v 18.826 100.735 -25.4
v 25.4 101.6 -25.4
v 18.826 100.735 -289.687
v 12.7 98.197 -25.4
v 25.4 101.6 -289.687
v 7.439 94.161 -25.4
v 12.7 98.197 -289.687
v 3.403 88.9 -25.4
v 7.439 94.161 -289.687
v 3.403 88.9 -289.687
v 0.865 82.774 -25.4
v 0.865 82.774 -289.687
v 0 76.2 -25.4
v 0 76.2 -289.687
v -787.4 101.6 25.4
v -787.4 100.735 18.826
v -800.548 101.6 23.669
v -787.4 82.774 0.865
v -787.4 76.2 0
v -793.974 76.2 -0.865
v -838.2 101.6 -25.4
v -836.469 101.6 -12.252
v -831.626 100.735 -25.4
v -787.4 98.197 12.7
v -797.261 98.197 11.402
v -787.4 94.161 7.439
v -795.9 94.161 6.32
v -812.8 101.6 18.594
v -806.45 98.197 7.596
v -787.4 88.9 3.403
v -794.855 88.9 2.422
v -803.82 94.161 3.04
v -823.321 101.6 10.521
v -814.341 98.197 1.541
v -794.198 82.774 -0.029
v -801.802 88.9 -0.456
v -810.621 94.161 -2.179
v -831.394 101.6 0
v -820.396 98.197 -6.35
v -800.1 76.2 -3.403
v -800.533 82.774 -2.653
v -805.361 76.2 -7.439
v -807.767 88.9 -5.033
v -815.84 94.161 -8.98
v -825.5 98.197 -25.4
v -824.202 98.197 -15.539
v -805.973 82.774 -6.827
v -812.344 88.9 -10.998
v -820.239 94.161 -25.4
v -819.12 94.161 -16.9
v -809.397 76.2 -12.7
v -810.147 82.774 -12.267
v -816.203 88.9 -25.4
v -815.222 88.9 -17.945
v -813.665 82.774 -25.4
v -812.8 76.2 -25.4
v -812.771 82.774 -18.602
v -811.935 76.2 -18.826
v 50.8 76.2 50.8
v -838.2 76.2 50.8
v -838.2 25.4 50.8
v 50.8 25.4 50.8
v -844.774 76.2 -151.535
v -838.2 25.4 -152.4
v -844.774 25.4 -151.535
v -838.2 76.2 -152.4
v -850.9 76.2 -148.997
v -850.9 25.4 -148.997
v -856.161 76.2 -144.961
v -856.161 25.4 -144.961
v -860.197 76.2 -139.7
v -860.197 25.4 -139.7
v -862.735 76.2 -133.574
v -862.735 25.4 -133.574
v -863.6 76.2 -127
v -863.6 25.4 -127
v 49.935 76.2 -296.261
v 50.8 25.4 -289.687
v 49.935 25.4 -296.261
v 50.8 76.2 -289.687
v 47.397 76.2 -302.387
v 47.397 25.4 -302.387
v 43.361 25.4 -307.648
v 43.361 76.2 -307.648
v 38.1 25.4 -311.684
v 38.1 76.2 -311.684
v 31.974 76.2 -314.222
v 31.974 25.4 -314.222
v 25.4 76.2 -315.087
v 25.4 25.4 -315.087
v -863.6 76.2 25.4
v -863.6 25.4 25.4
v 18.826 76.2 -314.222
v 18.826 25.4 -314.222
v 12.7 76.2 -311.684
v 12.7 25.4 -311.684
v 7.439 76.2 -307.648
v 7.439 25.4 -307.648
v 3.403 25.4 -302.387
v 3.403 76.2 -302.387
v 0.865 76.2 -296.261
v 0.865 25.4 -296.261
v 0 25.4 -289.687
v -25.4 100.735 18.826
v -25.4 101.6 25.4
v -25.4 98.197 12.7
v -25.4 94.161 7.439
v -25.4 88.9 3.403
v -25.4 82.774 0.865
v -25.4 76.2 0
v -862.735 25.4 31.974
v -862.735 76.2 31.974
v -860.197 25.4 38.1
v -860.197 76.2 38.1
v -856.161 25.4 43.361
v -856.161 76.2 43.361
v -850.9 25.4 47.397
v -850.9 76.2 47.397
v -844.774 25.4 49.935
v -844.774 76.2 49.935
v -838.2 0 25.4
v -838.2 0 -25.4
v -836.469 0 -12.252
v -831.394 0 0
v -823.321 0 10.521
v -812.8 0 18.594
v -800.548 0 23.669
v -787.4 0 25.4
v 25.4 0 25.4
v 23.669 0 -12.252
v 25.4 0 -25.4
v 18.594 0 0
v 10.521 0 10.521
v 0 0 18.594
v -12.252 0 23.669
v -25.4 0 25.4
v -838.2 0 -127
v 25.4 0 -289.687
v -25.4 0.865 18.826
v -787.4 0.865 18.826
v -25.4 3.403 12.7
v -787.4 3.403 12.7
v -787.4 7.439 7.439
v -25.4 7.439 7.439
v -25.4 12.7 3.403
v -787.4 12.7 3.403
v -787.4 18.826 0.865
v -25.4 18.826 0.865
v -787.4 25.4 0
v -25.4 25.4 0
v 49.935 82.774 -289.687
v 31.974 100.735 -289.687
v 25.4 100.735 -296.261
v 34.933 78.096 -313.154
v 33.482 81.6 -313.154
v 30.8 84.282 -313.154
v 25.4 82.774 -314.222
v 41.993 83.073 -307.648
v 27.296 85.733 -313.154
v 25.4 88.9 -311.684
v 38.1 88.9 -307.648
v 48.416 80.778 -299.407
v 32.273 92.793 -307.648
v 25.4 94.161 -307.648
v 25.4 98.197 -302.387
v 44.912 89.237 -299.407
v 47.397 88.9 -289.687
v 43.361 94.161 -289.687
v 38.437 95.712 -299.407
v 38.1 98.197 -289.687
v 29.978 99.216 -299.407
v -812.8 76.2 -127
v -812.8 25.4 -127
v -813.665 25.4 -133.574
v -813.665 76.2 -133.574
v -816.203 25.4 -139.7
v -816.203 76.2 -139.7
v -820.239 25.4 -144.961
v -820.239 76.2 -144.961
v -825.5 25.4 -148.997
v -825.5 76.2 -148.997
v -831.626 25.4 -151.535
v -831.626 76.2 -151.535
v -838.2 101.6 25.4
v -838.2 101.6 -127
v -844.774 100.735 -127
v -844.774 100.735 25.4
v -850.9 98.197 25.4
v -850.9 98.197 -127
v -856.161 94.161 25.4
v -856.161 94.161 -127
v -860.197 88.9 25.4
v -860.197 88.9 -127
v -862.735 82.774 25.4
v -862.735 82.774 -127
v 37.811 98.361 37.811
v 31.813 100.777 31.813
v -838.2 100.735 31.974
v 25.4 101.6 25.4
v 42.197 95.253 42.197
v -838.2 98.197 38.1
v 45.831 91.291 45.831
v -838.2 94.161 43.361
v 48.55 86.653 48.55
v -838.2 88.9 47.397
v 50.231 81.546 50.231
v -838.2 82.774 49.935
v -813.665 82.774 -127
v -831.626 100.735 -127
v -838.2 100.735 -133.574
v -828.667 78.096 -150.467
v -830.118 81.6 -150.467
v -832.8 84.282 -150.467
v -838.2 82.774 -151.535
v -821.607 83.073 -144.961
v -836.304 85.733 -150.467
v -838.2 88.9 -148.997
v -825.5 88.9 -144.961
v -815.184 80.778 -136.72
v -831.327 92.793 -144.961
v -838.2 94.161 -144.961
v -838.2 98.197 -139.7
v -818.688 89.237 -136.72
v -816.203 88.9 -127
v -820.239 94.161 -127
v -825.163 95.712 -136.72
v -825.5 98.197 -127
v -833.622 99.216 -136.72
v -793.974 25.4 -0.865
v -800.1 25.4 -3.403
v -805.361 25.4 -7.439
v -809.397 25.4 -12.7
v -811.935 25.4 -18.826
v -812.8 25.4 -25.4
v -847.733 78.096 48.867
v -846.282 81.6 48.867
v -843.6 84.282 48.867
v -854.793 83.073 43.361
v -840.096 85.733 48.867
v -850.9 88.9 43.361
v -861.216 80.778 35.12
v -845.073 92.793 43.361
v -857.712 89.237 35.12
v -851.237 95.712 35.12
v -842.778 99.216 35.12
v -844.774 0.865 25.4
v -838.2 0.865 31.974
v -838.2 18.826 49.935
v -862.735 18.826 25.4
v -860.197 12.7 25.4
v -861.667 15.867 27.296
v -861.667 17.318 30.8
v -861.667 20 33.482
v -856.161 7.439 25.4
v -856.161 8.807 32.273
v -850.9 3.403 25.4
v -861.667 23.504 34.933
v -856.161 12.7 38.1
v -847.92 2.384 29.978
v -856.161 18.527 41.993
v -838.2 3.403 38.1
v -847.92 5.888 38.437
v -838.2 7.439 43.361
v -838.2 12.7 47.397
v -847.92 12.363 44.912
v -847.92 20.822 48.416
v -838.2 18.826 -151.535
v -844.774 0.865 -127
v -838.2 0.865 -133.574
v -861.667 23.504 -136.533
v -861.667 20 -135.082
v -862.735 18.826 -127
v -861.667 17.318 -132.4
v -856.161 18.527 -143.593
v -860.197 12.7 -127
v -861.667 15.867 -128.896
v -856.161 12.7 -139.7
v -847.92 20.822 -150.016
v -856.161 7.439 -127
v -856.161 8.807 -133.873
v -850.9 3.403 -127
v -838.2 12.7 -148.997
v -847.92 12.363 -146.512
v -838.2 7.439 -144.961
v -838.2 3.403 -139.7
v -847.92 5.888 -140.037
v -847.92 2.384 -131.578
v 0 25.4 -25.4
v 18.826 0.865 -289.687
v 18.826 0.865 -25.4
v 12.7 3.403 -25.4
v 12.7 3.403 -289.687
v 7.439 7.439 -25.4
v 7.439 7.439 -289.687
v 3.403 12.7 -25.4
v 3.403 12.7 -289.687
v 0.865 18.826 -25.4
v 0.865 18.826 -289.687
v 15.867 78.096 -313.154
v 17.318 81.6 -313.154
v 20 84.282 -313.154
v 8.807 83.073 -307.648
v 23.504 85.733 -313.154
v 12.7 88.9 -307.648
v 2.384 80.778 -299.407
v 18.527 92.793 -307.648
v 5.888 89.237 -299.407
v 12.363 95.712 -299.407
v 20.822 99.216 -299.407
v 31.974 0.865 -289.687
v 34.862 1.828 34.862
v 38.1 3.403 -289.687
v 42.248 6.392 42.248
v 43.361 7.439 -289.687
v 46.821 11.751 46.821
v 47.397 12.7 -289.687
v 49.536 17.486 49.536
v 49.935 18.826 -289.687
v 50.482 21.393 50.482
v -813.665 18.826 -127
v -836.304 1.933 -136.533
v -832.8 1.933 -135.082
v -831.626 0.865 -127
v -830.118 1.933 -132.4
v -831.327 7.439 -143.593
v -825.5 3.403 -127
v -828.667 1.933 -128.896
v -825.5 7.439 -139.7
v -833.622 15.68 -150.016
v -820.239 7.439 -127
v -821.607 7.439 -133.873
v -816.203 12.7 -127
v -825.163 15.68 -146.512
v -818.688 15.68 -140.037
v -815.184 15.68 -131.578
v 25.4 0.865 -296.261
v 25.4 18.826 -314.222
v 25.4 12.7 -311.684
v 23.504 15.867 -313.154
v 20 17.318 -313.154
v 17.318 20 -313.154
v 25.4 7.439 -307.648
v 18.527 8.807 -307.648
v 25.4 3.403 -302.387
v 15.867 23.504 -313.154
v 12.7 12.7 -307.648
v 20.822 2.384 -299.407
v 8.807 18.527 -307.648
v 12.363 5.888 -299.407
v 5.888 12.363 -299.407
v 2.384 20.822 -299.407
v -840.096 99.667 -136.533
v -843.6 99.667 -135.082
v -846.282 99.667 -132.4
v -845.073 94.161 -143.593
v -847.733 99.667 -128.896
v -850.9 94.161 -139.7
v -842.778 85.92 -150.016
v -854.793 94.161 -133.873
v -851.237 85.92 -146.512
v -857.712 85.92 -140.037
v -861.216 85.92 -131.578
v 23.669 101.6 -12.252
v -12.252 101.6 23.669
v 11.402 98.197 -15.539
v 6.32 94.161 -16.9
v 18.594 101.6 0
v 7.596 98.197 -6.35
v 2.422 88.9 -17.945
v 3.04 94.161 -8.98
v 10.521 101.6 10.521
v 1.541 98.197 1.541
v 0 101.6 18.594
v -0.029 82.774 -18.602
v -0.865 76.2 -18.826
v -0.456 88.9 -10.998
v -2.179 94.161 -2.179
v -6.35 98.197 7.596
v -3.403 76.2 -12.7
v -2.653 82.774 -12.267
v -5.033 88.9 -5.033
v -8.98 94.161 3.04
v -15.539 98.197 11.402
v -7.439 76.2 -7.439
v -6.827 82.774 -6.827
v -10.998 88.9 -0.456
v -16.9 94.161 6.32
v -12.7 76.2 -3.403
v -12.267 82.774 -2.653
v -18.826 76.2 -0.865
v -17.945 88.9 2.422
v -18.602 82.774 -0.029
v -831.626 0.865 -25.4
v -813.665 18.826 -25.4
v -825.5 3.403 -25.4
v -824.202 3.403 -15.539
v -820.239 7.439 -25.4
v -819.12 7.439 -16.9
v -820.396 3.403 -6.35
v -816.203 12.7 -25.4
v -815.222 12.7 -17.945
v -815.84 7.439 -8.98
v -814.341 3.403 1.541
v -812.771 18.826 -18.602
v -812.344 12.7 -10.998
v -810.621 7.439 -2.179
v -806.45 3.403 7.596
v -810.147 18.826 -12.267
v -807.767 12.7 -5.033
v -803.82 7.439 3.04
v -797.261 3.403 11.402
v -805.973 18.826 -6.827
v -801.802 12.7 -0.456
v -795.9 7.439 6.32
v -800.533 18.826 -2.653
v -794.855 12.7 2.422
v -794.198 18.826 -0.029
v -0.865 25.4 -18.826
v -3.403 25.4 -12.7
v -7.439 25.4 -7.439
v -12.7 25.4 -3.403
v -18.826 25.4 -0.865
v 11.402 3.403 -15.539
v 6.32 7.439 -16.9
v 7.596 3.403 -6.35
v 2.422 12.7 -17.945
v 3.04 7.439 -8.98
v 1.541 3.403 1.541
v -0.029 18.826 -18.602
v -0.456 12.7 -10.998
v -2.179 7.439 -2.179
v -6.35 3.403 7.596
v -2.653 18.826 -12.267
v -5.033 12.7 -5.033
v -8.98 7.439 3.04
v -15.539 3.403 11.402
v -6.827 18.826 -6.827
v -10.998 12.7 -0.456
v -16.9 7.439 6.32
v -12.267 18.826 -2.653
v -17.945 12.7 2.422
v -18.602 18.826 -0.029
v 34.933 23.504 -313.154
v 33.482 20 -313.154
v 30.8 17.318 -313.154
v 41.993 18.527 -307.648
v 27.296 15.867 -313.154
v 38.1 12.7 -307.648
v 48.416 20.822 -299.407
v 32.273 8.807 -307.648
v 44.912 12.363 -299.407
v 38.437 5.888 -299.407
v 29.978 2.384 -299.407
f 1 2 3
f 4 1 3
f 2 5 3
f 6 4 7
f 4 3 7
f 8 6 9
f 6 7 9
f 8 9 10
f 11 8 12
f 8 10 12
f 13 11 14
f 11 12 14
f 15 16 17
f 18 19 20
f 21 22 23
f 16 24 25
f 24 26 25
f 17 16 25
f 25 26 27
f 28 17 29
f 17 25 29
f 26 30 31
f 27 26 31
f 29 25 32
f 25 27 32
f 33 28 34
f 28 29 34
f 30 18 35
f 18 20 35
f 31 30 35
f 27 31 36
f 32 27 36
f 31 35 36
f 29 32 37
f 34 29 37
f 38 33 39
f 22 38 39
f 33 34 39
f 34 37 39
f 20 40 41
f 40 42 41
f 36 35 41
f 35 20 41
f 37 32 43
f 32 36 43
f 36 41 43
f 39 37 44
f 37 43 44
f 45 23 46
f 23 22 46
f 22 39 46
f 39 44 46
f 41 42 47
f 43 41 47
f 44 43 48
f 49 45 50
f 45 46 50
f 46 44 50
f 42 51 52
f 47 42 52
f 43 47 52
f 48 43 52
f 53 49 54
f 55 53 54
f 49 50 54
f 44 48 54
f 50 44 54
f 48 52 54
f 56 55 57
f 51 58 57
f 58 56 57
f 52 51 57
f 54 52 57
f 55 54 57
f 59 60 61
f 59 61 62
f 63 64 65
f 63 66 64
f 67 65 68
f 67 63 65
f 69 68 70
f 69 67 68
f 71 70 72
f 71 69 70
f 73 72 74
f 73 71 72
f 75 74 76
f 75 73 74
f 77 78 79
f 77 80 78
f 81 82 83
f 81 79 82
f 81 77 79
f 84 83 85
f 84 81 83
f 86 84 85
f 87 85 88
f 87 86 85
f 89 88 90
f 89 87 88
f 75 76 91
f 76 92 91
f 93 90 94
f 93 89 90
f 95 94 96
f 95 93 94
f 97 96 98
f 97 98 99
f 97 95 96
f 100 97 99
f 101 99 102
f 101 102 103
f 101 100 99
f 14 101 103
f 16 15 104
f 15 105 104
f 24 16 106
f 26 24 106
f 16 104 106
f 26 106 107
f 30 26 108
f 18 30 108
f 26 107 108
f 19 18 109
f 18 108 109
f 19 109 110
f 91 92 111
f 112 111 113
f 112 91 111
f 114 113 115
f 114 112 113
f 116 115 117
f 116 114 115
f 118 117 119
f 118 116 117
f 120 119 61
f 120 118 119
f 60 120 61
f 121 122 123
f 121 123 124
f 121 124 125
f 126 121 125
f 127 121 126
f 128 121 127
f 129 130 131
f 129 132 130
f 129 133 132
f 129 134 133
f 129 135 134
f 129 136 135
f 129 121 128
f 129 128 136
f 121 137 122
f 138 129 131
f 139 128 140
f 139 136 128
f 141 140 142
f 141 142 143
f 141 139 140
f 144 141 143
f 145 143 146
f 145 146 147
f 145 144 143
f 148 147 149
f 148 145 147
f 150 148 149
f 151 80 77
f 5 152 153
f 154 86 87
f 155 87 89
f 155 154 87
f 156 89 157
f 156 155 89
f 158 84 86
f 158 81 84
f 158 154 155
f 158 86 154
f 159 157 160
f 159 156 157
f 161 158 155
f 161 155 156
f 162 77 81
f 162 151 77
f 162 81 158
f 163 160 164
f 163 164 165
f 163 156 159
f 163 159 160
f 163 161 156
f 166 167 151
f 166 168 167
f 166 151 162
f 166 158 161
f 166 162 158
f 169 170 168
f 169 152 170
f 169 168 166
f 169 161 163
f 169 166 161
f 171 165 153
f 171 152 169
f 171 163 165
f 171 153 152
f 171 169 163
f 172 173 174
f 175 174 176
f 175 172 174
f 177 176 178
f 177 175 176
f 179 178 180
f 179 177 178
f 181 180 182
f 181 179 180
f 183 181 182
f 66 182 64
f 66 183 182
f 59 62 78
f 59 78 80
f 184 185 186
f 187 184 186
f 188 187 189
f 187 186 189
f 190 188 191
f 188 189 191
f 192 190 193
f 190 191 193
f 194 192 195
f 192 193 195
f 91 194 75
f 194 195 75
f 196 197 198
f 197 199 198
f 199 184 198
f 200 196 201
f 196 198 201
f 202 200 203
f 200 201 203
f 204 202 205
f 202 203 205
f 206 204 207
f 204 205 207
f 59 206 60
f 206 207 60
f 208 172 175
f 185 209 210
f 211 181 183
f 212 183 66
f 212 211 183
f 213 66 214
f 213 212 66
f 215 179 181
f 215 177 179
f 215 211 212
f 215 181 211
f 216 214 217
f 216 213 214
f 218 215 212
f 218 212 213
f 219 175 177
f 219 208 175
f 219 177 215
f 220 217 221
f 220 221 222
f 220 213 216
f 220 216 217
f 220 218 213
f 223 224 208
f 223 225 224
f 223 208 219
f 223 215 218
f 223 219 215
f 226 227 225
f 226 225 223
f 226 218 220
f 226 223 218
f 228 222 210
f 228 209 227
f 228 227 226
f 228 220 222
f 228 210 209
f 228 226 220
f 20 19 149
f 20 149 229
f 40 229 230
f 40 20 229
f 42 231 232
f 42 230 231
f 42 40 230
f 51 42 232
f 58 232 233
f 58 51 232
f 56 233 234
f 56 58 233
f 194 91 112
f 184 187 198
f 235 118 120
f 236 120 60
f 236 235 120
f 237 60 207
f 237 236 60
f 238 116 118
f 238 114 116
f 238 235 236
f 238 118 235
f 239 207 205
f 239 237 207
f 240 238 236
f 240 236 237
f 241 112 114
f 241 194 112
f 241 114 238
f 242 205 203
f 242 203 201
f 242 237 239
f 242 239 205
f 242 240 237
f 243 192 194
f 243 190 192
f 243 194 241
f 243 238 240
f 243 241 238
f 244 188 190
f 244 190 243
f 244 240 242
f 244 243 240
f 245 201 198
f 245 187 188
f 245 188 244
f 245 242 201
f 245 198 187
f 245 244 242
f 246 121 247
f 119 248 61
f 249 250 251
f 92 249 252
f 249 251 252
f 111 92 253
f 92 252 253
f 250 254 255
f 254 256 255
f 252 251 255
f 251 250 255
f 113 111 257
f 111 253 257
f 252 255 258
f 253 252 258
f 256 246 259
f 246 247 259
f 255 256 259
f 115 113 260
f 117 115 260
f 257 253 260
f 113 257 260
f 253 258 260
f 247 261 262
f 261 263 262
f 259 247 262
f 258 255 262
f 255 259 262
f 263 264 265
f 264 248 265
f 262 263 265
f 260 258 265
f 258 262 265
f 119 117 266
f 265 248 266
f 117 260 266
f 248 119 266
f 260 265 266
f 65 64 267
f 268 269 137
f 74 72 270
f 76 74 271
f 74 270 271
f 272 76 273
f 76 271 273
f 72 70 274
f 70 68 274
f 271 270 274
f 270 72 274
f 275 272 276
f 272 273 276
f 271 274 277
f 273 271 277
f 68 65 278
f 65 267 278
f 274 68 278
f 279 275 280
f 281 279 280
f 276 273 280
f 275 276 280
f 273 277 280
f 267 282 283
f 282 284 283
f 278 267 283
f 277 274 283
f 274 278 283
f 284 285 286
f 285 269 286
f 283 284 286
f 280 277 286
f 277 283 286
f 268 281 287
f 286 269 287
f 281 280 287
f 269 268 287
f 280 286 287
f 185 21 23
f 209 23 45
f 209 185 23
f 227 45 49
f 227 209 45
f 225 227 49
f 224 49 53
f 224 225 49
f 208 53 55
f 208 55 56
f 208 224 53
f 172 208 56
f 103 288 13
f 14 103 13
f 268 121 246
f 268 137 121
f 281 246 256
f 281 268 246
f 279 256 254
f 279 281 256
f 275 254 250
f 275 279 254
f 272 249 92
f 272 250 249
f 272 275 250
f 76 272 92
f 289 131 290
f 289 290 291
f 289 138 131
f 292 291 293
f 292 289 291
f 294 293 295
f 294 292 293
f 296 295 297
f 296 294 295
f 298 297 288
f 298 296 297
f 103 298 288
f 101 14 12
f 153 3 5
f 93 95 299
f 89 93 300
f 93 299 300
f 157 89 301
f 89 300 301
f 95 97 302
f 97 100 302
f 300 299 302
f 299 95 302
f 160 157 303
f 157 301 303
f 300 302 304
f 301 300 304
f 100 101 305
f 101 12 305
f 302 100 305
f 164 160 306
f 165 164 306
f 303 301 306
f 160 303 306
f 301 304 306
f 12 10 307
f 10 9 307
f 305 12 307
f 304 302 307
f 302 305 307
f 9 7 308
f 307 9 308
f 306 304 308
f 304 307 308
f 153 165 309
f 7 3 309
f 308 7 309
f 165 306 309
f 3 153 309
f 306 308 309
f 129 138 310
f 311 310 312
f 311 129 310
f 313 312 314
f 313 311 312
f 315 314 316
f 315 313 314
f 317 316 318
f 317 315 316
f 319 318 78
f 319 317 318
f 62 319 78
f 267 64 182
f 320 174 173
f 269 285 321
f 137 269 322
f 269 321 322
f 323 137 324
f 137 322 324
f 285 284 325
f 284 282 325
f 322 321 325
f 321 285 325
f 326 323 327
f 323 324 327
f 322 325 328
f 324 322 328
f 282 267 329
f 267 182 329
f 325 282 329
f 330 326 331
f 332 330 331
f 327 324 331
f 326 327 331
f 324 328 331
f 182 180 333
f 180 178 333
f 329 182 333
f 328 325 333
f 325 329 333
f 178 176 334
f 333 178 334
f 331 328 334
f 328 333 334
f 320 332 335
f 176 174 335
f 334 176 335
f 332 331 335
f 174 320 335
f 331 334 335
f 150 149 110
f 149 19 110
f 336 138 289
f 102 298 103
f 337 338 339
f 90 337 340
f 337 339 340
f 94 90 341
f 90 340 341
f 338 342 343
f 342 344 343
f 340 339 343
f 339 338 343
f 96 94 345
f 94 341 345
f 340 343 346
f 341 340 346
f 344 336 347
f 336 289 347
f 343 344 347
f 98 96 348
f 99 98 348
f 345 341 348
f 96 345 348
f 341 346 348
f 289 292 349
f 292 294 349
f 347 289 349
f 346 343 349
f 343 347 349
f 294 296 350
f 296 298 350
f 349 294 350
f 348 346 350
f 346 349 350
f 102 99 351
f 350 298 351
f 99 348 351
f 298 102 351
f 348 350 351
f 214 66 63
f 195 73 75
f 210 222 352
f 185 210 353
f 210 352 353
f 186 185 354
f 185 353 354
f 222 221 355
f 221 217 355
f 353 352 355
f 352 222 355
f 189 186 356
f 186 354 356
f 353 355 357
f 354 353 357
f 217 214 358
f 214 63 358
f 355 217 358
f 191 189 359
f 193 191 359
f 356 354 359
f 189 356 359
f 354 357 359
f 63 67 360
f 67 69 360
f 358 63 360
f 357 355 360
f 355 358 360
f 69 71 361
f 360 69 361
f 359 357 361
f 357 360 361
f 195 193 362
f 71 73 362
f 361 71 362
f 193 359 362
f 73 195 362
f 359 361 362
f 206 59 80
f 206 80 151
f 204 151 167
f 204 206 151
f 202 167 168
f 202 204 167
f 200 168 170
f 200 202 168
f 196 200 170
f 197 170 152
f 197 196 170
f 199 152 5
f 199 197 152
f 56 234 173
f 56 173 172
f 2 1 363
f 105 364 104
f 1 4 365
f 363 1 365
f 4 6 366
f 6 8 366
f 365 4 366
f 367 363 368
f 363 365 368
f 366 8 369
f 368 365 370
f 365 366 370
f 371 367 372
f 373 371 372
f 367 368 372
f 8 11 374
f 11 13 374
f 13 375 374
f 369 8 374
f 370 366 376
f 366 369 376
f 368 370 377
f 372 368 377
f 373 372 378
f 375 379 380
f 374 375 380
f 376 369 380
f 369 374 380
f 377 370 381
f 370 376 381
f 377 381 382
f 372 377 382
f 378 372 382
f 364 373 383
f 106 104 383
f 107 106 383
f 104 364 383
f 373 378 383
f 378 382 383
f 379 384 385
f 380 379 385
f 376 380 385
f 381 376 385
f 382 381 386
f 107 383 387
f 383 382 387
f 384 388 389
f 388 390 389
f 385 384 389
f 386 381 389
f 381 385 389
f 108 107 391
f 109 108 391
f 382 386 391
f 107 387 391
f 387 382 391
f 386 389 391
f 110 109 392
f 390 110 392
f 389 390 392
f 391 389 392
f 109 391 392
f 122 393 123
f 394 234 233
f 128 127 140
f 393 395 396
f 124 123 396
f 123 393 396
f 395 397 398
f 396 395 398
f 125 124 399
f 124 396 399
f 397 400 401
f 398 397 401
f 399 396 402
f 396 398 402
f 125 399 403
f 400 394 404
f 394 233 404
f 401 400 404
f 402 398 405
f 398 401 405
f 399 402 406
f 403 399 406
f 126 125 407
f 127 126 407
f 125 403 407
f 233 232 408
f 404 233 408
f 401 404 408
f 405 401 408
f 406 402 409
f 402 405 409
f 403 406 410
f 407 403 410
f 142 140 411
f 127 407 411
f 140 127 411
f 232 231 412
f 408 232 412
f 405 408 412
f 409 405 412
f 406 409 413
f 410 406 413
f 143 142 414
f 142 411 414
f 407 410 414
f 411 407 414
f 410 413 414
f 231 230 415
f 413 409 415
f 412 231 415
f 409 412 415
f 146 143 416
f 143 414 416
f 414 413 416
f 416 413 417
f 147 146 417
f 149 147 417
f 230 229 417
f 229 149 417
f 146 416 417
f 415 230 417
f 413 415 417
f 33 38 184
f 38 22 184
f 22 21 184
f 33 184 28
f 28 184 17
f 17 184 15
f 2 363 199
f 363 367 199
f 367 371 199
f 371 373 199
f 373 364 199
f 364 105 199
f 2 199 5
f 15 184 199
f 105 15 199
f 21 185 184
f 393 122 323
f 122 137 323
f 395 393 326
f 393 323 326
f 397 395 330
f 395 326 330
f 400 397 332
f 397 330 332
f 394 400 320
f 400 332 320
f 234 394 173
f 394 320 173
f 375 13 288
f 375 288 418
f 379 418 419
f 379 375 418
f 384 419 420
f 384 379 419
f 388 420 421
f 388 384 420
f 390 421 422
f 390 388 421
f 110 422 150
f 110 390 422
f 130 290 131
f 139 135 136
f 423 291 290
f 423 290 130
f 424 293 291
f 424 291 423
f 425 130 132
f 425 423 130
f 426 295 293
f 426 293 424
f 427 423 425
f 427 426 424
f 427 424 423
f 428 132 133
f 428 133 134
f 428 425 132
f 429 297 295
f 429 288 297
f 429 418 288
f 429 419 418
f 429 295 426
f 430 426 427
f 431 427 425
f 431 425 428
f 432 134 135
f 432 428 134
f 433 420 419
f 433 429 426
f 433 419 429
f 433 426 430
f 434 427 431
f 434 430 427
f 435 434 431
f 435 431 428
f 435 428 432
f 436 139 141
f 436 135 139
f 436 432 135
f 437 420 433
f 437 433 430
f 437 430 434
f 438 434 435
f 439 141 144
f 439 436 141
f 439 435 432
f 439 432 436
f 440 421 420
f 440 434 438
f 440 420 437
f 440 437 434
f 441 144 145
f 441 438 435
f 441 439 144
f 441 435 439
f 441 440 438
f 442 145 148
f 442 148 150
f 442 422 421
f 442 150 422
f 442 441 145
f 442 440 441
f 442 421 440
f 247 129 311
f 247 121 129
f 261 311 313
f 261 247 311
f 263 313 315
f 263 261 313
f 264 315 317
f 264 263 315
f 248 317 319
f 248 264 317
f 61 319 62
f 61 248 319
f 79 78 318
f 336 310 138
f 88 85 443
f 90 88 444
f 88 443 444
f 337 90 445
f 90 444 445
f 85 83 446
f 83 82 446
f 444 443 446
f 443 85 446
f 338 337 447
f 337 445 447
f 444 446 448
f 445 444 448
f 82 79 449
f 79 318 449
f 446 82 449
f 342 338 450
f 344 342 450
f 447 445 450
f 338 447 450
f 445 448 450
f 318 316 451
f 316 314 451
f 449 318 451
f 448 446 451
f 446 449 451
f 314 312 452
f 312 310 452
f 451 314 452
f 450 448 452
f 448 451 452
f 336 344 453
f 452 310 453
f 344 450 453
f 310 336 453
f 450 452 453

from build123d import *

# Parameters (mm, degrees)
SKETCH1_W           = 812.8
SKETCH1_H           = 101.6
BOSS_EXTRUDE1_DEPTH = 50.8
SKETCH2_W           = 50.8
SKETCH2_H           = 101.6
BOSS_EXTRUDE2_DEPTH = 203.2
SKETCH6_W           = 365.887
SKETCH6_H           = 101.6
BOSS_EXTRUDE4_DEPTH = 50.8
FILLET2_R           = 25.4


with BuildPart() as part:
    # Sketch1 → Boss-Extrude1 (new body)
    with BuildSketch(Plane.XY):
        with Locations((-406.4, 50.8)):
            Rectangle(SKETCH1_W, SKETCH1_H)
    extrude(amount=BOSS_EXTRUDE1_DEPTH)

    # Sketch2 → Boss-Extrude2 (add)
    with BuildSketch(Plane.XY.offset(50.8)):
        with Locations((-838.2, 50.8)):
            Rectangle(SKETCH2_W, SKETCH2_H)
        with Locations((25.4, 50.8)):
            Rectangle(SKETCH2_W, SKETCH2_H)
    extrude(amount=-BOSS_EXTRUDE2_DEPTH)

    # Sketch6 → Boss-Extrude4 (add)
    with BuildSketch(Plane(origin=(50.8, 0, 0), x_dir=(0, 0, -1), z_dir=(1, 0, 0))):
        with Locations((132.1435, 50.8)):
            Rectangle(SKETCH6_W, SKETCH6_H)
    extrude(amount=-BOSS_EXTRUDE4_DEPTH)

    # Fillet2
    fillet2_edges = [part.edges().sort_by_distance(p)[0] for p in [
        (-406.4, 0, 50.8),
        (-812.8, 101.6, -76.2),
        (-812.8, 50.8, -152.4),
        (-838.2, 0, -152.4),
        (-812.8, 0, -76.2),
        (-863.6, 50.8, -152.4),
        (-863.6, 0, -50.8),
        (-838.2, 101.6, -152.4),
        (-863.6, 101.6, -50.8),
        (-863.6, 50.8, 50.8),
        (0, 0, -157.5435),
        (0, 101.6, -157.5435),
        (50.8, 101.6, -132.1435),
        (50.8, 0, -132.1435),
        (50.8, 50.8, -315.087),
        (25.4, 0, -315.087),
        (0, 50.8, -315.087),
        (25.4, 101.6, -315.087),
        (-406.4, 0, 0),
        (-812.8, 50.8, 0),
        (-406.4, 101.6, 0),
        (0, 50.8, 0),
        (-406.4, 101.6, 50.8),
    ]]
    fillet(fillet2_edges, radius=FILLET2_R - 0.0001)  # a hair under: the kernel refuses the full size


solid = part.part
